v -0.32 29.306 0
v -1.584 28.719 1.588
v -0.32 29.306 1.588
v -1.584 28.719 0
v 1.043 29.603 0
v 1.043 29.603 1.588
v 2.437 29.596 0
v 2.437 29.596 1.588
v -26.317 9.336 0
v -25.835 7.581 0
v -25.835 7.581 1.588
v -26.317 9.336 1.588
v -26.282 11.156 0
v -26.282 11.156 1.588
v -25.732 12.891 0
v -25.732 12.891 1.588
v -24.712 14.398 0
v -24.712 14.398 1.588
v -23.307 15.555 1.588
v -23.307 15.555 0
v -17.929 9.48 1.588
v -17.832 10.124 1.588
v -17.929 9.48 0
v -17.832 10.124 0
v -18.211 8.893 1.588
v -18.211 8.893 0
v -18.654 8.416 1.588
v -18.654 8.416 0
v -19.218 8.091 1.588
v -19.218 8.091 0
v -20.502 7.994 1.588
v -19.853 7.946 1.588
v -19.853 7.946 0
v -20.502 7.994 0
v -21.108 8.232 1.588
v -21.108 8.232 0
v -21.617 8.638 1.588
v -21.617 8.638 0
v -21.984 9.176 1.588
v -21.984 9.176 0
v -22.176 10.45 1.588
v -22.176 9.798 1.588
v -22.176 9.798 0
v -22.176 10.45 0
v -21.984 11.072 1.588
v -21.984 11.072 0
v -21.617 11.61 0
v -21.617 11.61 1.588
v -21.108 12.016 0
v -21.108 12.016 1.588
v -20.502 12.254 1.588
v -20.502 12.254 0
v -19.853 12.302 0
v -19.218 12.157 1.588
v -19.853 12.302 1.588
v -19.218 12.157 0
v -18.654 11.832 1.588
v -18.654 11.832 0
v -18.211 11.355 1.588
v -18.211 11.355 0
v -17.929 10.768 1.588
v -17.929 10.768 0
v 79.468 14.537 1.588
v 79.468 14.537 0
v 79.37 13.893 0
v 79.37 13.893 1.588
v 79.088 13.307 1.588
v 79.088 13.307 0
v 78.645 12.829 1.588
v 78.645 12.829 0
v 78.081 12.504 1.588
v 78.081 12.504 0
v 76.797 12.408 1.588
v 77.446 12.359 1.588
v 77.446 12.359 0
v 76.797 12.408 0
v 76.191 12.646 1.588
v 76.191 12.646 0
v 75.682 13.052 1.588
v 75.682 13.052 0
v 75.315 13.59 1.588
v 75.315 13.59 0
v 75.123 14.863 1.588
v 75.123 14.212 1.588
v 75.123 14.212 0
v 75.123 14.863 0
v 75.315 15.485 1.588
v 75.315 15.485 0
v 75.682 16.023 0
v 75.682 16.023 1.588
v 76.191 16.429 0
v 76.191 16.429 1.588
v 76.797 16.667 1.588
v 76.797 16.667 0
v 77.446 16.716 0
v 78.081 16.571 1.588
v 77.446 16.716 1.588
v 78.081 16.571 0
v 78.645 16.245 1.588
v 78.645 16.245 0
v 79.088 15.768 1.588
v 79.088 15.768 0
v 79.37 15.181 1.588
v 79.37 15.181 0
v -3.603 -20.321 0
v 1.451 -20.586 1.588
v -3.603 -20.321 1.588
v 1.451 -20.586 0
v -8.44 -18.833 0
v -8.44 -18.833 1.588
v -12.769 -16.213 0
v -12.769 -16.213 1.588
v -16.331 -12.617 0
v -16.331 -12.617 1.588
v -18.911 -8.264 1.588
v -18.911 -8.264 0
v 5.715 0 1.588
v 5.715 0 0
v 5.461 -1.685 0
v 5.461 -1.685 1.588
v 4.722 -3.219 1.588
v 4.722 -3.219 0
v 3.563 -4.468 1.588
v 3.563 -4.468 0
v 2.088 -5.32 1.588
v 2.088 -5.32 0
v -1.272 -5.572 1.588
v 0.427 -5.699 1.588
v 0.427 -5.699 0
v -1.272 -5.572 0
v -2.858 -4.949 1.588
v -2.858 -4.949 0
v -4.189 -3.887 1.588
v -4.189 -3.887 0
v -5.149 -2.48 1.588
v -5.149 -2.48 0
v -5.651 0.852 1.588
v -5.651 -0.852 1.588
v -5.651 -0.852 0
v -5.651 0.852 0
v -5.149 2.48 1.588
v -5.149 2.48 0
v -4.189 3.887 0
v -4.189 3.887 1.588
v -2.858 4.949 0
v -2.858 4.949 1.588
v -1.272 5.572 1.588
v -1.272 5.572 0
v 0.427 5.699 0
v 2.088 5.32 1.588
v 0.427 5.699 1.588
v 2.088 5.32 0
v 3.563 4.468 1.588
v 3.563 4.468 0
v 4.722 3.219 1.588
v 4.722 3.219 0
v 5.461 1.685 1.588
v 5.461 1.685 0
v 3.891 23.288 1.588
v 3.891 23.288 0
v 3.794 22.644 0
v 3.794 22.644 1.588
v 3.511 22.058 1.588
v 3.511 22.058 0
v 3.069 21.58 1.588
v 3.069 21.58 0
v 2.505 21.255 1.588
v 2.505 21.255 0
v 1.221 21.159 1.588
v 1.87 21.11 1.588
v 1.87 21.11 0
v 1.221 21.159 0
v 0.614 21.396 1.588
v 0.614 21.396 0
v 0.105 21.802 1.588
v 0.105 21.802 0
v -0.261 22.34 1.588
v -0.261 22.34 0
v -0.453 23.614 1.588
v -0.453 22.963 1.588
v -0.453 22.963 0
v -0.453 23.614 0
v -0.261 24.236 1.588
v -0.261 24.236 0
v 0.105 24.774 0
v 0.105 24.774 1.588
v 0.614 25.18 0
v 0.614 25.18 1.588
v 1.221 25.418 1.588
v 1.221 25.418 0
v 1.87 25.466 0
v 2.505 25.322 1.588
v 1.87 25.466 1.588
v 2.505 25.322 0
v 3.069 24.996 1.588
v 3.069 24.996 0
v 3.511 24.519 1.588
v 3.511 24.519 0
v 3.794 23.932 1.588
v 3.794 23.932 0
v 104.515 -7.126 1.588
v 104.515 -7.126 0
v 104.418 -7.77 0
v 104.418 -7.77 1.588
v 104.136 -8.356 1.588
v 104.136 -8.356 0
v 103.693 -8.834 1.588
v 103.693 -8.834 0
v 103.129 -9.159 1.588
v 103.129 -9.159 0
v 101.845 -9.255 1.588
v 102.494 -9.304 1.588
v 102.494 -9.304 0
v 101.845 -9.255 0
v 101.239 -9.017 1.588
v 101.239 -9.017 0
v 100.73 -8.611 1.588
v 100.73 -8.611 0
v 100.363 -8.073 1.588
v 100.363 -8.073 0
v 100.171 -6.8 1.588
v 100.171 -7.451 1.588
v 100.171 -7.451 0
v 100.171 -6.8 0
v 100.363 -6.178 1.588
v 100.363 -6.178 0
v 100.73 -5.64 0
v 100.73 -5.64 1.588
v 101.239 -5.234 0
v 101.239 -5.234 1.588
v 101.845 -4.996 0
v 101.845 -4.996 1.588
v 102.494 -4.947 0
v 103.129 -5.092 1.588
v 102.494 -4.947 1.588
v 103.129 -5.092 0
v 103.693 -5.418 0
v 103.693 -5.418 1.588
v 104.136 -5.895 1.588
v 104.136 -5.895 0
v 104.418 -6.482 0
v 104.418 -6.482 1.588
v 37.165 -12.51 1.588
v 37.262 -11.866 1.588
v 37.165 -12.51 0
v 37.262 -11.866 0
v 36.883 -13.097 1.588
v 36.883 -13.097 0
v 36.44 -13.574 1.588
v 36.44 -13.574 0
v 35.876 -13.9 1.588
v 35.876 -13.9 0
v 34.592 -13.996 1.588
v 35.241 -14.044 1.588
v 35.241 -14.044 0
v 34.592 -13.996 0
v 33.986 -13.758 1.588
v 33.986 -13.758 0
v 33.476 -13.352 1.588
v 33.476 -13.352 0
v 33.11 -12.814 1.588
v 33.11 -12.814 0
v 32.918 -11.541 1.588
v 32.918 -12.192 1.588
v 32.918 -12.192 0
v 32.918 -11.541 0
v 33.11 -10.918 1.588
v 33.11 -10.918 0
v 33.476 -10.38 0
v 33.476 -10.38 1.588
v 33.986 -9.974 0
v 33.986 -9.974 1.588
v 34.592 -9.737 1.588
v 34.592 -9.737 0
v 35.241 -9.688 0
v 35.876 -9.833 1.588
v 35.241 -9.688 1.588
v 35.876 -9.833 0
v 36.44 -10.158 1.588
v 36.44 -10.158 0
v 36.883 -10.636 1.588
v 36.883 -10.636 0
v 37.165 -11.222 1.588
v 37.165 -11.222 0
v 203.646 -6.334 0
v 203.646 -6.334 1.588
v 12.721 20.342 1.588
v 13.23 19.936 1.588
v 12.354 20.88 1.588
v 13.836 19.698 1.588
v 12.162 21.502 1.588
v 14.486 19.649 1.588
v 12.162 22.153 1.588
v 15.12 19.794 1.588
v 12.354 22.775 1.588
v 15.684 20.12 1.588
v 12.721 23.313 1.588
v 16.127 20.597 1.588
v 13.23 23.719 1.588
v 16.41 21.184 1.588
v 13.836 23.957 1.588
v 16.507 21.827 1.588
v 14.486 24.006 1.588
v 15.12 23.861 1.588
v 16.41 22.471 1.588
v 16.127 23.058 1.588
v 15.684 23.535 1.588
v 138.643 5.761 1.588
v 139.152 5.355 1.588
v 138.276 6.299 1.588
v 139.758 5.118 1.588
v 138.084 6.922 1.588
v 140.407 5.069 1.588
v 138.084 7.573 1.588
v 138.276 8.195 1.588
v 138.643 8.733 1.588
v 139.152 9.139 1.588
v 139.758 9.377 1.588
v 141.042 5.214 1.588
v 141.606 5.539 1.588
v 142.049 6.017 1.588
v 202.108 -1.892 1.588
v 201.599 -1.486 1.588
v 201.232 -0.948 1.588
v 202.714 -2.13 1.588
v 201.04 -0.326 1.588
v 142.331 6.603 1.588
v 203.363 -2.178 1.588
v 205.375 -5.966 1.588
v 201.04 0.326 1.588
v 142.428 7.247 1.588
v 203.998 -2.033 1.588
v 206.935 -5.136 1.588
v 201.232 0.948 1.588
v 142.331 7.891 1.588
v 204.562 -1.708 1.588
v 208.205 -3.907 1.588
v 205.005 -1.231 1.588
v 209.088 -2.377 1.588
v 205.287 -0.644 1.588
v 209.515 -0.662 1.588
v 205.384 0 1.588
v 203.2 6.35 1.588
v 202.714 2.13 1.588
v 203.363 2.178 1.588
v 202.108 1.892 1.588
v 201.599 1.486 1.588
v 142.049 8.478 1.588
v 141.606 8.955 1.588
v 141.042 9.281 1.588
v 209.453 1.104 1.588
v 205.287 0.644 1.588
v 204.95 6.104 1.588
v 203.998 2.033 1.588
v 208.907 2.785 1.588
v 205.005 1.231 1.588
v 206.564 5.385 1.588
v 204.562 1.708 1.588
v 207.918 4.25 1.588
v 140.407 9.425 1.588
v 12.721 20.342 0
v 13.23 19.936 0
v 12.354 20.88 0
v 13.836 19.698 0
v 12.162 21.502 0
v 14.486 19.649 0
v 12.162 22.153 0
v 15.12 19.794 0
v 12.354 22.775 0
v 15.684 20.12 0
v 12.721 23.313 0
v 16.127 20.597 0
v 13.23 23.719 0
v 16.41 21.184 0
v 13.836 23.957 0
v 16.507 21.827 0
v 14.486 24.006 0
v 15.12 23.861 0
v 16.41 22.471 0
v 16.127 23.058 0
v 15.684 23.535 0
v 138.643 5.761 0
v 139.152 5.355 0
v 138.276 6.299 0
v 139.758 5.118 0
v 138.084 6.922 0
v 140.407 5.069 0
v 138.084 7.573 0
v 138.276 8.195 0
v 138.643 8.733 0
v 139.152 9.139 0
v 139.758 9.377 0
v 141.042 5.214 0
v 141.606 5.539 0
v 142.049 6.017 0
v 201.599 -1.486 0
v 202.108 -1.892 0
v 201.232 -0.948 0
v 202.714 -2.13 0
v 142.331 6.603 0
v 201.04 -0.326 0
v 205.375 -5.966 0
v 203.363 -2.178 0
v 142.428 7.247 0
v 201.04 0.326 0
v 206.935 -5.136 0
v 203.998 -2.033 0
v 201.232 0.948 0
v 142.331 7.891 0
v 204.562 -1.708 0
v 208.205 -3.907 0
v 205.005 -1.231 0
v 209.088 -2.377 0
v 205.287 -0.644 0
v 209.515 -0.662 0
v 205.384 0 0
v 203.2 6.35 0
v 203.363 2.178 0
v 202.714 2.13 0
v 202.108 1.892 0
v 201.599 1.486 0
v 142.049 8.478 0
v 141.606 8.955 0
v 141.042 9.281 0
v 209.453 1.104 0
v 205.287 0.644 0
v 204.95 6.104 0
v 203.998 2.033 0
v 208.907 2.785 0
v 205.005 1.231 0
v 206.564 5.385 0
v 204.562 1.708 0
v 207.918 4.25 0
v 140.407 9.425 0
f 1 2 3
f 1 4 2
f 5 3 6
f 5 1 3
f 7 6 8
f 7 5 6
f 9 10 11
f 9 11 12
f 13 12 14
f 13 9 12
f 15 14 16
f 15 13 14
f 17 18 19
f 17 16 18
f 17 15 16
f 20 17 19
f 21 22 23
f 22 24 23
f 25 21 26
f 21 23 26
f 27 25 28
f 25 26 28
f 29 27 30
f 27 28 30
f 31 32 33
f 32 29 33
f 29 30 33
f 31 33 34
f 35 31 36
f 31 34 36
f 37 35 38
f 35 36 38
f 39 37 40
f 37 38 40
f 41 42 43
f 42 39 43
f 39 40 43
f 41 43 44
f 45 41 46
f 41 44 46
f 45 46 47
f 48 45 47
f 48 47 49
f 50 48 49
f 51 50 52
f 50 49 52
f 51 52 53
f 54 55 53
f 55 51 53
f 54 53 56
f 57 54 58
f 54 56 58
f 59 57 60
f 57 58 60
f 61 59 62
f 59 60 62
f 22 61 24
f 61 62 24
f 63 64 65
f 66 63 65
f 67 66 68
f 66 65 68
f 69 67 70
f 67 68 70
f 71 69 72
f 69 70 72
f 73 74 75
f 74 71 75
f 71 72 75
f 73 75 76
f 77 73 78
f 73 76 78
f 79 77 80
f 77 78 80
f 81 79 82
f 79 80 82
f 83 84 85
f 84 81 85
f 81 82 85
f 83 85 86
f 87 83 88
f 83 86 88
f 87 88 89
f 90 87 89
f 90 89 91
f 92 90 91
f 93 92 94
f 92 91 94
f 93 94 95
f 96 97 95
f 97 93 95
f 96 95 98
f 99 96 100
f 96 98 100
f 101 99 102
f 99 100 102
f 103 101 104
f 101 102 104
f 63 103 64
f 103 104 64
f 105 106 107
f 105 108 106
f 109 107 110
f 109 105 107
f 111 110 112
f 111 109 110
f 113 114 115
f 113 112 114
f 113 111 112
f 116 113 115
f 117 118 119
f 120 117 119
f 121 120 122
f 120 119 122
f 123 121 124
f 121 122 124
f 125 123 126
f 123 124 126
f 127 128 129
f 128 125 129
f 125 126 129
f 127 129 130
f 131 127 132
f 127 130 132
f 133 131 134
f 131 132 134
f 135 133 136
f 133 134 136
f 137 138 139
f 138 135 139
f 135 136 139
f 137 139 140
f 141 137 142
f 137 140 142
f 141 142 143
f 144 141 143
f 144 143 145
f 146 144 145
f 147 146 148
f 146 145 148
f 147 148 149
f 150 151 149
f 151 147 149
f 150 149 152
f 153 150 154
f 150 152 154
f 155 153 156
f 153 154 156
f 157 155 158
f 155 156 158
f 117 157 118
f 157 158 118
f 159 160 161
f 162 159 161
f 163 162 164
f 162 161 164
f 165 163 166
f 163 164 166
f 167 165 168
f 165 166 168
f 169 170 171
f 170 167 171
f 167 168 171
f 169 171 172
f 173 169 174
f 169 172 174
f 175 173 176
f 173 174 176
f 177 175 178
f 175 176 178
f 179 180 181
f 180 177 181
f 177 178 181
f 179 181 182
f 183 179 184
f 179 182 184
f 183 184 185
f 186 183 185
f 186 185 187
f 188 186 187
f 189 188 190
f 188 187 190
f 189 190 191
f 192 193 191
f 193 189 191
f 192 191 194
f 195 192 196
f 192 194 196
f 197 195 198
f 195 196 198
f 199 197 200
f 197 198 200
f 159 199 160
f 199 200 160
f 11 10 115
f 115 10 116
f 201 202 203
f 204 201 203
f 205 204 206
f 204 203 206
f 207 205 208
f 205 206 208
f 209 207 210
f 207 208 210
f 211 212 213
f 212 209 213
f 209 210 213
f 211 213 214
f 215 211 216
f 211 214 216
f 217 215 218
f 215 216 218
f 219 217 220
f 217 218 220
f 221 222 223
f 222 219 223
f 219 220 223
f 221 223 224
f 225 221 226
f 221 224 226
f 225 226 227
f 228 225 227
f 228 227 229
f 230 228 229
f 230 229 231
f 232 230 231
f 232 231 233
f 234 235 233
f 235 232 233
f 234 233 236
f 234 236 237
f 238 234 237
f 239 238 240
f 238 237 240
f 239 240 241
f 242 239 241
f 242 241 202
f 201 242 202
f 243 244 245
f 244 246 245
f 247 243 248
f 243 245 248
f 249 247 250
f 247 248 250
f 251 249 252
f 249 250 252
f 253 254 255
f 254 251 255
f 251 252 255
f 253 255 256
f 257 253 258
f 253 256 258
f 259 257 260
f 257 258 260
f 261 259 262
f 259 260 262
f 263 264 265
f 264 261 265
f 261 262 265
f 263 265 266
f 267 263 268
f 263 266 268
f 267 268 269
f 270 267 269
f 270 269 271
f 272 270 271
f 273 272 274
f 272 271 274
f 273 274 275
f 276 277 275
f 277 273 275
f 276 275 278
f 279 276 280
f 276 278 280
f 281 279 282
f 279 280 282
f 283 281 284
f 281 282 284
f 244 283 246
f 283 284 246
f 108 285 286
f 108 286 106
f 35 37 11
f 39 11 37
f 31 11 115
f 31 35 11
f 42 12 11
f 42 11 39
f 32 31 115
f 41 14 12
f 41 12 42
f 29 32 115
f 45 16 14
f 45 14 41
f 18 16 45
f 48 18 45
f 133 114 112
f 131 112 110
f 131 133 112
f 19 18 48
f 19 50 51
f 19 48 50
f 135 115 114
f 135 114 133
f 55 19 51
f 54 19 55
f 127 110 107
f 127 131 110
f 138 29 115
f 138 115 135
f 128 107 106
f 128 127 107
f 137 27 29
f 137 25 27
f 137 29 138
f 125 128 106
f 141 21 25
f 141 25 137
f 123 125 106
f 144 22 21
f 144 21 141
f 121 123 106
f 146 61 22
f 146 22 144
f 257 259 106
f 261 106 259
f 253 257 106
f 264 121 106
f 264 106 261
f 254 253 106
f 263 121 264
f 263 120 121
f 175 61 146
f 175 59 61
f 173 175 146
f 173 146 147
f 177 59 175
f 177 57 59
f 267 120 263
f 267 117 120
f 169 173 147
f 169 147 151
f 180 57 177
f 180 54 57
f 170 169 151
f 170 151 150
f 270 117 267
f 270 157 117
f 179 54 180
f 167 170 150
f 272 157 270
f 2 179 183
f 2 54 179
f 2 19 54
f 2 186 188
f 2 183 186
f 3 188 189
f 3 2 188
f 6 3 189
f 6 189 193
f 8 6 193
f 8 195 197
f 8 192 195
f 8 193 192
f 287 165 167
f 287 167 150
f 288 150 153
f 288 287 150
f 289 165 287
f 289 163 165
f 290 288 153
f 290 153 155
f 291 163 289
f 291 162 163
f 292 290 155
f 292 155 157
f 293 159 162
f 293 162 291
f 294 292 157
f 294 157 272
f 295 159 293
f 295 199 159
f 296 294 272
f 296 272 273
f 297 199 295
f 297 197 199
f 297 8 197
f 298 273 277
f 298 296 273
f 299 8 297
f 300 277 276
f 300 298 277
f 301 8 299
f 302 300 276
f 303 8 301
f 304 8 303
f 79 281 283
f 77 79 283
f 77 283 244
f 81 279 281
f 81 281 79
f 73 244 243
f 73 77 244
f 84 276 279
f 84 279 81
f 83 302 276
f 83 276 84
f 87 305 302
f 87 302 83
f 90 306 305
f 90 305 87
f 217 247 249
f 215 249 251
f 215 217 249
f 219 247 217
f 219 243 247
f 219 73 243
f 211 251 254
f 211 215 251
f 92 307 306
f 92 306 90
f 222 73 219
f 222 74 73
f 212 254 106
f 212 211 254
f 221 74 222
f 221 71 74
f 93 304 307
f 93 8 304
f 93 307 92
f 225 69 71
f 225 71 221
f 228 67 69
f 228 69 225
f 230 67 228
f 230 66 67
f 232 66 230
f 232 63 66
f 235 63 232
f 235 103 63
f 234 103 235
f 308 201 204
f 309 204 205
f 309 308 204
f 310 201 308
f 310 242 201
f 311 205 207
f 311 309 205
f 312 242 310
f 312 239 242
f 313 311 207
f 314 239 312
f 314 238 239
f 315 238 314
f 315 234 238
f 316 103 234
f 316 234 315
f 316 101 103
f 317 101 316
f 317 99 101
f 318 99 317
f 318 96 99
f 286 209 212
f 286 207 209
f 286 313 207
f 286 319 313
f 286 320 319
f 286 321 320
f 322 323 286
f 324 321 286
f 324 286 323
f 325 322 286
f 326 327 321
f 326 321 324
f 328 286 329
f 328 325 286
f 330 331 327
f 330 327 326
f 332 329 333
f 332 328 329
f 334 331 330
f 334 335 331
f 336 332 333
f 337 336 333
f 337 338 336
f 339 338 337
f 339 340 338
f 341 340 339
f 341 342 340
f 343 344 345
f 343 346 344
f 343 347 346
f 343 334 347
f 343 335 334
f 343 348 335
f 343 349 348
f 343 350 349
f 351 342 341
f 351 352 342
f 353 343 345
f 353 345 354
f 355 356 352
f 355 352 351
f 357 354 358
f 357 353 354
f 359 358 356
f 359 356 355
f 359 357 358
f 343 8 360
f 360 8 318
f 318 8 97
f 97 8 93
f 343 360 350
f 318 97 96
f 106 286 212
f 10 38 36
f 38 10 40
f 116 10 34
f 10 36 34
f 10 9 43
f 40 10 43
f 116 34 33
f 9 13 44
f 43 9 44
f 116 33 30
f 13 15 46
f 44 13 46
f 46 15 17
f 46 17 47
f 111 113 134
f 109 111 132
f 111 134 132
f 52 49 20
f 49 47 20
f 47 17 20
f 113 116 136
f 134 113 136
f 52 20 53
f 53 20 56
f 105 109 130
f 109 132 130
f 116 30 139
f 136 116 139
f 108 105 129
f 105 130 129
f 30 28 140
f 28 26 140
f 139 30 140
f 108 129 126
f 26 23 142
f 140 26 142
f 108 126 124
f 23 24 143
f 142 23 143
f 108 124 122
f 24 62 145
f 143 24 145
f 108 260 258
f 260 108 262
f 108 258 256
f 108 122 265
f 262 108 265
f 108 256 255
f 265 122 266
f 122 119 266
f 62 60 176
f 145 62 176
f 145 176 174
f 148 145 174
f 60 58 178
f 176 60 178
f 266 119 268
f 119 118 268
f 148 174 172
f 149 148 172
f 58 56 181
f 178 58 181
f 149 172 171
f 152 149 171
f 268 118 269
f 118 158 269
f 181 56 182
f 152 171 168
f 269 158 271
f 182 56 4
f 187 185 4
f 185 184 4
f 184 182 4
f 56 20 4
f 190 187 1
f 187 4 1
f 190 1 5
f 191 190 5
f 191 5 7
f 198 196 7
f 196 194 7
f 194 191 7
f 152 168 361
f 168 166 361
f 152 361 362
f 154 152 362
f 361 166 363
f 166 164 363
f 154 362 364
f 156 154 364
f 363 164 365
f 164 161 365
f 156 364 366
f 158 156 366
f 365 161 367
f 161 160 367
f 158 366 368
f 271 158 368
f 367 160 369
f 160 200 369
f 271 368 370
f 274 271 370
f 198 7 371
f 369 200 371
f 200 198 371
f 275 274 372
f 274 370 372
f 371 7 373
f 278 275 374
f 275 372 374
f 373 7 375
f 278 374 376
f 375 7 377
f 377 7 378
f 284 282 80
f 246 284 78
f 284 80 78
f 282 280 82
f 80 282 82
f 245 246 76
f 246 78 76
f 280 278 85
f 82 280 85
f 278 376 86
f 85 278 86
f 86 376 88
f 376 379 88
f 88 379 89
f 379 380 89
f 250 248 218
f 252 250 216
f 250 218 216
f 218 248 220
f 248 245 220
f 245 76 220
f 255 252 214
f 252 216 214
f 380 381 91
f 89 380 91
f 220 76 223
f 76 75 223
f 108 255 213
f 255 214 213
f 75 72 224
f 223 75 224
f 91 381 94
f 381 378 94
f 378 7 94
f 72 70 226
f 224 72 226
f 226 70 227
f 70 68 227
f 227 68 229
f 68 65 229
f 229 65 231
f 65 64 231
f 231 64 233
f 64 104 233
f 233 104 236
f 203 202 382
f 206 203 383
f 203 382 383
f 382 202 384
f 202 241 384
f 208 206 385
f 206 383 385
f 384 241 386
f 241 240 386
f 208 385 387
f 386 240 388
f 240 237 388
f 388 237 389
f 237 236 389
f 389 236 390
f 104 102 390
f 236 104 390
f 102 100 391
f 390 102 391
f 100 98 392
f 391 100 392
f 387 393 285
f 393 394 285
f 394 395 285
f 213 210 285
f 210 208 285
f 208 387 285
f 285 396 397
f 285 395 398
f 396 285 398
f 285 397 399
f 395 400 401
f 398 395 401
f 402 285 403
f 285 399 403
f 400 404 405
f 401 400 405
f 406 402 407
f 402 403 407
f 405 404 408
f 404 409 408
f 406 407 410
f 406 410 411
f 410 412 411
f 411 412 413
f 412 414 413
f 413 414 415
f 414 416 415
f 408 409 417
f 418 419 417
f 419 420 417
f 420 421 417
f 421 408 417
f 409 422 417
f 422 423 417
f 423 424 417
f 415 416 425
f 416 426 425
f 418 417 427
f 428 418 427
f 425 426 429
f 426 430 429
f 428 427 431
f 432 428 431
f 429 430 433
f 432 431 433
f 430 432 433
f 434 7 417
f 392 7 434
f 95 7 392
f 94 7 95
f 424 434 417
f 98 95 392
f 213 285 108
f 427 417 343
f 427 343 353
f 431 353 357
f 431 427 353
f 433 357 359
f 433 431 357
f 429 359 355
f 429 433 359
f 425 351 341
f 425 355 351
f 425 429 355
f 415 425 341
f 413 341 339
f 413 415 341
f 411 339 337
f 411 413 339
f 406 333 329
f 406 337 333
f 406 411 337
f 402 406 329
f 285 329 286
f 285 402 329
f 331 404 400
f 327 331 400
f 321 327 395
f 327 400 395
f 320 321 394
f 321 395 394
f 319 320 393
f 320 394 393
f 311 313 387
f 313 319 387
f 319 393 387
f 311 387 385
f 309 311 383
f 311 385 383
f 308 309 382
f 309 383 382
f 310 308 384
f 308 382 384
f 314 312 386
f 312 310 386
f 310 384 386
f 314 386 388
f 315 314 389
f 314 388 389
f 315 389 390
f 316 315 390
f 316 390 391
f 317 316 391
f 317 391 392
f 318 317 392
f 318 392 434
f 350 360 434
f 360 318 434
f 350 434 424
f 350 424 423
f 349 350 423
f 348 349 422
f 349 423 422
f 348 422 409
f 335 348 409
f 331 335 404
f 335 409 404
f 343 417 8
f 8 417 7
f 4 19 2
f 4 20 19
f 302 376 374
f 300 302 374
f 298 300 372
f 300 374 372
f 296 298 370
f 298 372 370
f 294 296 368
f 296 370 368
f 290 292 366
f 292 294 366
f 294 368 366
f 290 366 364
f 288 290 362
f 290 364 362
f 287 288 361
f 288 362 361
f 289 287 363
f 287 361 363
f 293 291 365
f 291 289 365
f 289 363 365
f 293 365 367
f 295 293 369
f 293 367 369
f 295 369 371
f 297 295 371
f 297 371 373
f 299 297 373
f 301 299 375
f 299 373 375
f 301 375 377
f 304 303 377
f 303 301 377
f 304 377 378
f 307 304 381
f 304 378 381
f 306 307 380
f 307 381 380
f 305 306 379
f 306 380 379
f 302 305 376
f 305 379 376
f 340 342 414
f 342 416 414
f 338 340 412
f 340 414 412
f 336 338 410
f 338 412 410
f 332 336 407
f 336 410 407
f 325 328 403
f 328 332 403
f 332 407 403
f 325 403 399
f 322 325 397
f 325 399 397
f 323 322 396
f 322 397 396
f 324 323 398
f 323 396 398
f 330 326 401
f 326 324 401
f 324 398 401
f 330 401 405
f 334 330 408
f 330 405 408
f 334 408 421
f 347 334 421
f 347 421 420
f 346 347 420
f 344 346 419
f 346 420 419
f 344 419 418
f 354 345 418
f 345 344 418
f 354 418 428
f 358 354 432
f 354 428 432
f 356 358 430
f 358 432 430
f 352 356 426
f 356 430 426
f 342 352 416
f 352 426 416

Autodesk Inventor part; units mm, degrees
ref_plane "YZ Plane" through (0, 0, 0) normal (1, 0, 0) x (0, 1, 0)
ref_plane "XZ Plane" through (0, 0, 0) normal (0, 1, 0) x (-1, 0, 0)
ref_plane "XY Plane" through (0, 0, 0) normal (0, 0, 1) x (1, 0, 0)
sketch "Sketch1" plane through (0, 0, 0) normal (0, 0, 1) x (1, 0, 0)
  circle A0 centre (0, 0) radius 5.715
  circle A1 centre (203.2, 0) radius 2.1844
  line L0 (203.6465, -6.3343) -> (1.4511, -20.5864)
  circle A2 centre (1.7066, 23.2882) radius 2.1844
  circle A3 centre (-20.0159, 10.124) radius 2.1844
  line L1 (-23.3069, 15.5547) -> (-1.5845, 28.7188)
  line L2 (-25.8346, 7.5814) -> (-18.9109, -8.2635)
  arc A4 (-23.3069, 15.5547) -> (-25.8346, 7.5814) centre (-20.0159, 10.124) ccw
  line L3 (203.2, 6.35) -> (2.4369, 29.596)
  arc A5 (2.4369, 29.596) -> (-1.5845, 28.7188) centre (1.7066, 23.2882) ccw
  arc A6 (-18.9109, -8.2635) -> (1.4511, -20.5864) centre (0, 0) ccw
  circle A7 centre (14.3223, 21.8274) radius 2.1844
  circle A8 centre (77.2831, 14.5373) radius 2.1844
  circle A9 centre (140.2439, 7.2472) radius 2.1844
  circle A10 centre (35.0777, -11.8662) radius 2.1844
  circle A11 centre (102.3309, -7.1257) radius 2.1844
  arc A12 (203.6465, -6.3343) -> (203.2, 6.35) centre (203.2, 0) ccw
  dimension "d0" = 11.43
  dimension "d3" = 4.3688
  dimension "d30" = 4.3688
  dimension "d36" = 4.3688
  dimension "d45" = 4.3688
  dimension "d47" = 4.3688
  dimension "d51" = 4.3688
  dimension "d52" = 4.3688
extrude "Extrusion1" add sketch "Sketch1" along normal blind 1.5875
properties part number "intake"
